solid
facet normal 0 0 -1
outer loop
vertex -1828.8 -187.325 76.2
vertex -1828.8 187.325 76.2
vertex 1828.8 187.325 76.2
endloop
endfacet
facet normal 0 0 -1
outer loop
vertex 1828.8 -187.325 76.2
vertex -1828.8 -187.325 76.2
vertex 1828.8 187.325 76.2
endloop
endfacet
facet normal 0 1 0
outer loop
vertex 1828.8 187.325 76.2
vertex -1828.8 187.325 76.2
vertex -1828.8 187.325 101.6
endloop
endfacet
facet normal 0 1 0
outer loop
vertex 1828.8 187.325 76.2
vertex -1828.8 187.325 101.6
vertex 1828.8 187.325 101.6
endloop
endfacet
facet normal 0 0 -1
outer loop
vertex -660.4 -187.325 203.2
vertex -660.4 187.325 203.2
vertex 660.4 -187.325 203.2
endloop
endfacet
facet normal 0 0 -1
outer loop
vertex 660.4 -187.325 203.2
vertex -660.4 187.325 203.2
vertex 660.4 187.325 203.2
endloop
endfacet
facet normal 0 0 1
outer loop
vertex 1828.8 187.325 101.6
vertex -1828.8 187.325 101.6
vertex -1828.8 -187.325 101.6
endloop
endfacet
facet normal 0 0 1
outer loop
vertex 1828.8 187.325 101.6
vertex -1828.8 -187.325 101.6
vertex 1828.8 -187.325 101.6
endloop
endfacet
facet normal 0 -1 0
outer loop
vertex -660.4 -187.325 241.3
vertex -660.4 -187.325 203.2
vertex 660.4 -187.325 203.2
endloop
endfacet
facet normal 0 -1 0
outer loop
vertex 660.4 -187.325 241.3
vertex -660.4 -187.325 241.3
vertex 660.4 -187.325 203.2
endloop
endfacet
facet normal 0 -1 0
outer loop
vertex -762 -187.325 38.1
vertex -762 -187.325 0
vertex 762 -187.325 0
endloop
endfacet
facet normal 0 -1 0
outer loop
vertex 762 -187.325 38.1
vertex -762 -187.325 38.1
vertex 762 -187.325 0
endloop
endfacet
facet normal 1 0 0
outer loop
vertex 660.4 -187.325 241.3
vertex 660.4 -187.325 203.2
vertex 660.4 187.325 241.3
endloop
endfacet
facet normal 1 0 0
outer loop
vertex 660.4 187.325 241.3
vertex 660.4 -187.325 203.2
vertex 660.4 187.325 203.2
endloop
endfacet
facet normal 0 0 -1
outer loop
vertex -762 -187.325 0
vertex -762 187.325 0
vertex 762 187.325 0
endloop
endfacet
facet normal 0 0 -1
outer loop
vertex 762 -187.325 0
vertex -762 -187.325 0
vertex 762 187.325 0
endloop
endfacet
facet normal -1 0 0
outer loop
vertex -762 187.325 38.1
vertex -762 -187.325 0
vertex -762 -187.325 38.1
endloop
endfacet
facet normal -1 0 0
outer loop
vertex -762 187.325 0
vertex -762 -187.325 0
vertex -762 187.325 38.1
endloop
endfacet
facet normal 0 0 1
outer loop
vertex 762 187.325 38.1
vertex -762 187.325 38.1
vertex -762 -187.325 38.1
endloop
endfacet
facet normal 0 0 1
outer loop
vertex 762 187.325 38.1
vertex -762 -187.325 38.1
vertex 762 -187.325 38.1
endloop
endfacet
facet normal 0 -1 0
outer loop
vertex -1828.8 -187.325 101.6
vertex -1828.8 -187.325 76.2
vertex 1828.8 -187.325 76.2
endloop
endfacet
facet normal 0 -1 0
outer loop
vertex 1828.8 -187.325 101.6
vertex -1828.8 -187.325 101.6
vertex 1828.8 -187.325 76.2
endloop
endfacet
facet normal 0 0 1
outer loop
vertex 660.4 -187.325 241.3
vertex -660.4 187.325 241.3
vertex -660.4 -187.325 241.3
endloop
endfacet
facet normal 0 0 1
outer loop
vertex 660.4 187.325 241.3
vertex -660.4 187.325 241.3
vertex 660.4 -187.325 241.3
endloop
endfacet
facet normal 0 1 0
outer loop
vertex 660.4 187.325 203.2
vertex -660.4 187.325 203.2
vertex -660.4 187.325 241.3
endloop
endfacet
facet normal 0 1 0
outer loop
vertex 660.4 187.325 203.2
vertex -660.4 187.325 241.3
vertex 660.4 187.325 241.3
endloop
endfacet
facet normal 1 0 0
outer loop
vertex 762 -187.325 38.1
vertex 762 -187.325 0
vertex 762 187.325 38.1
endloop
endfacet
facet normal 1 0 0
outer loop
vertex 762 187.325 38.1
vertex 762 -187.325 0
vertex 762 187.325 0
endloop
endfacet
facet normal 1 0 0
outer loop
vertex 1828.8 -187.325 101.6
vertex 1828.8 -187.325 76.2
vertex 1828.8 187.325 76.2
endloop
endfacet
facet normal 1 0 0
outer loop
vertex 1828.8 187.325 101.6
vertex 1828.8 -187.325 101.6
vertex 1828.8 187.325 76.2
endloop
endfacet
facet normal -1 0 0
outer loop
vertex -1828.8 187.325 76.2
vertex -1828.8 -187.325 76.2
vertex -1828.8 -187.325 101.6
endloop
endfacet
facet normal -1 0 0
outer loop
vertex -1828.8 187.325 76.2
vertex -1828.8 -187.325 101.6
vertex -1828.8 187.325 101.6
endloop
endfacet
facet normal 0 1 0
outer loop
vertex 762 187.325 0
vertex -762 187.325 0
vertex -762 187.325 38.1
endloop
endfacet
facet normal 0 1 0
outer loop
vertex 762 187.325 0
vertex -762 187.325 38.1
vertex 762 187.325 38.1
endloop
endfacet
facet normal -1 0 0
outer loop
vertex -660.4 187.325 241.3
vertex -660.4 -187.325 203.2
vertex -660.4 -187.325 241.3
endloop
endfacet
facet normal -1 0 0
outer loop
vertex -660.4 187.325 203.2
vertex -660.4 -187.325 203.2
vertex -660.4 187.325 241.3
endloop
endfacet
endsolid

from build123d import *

# Parameters (mm, degrees)
F0_W     = 1524
F0_H     = 374.65
F1_DEPTH = 38.1
F3_W     = 3657.6
F3_H     = 374.65
F4_DEPTH = 25.4
F6_W     = 1320.8
F6_H     = 374.65
F7_DEPTH = 38.1


with BuildPart() as f1:
    # F0 (on Top) → F1 (new body)
    with BuildSketch(Plane.XY):
        Rectangle(F0_W, F0_H)
    extrude(amount=F1_DEPTH)


with BuildPart() as f4:
    # F3 (on offset) → F4 (new body)
    with BuildSketch(Plane.XY.offset(76.2)):
        Rectangle(F3_W, F3_H)
    extrude(amount=F4_DEPTH)


with BuildPart() as f7:
    # F6 (on offset) → F7 (new body)
    with BuildSketch(Plane.XY.offset(203.2)):
        Rectangle(F6_W, F6_H)
    extrude(amount=F7_DEPTH)


solid = Compound([f1.part, f4.part, f7.part])
